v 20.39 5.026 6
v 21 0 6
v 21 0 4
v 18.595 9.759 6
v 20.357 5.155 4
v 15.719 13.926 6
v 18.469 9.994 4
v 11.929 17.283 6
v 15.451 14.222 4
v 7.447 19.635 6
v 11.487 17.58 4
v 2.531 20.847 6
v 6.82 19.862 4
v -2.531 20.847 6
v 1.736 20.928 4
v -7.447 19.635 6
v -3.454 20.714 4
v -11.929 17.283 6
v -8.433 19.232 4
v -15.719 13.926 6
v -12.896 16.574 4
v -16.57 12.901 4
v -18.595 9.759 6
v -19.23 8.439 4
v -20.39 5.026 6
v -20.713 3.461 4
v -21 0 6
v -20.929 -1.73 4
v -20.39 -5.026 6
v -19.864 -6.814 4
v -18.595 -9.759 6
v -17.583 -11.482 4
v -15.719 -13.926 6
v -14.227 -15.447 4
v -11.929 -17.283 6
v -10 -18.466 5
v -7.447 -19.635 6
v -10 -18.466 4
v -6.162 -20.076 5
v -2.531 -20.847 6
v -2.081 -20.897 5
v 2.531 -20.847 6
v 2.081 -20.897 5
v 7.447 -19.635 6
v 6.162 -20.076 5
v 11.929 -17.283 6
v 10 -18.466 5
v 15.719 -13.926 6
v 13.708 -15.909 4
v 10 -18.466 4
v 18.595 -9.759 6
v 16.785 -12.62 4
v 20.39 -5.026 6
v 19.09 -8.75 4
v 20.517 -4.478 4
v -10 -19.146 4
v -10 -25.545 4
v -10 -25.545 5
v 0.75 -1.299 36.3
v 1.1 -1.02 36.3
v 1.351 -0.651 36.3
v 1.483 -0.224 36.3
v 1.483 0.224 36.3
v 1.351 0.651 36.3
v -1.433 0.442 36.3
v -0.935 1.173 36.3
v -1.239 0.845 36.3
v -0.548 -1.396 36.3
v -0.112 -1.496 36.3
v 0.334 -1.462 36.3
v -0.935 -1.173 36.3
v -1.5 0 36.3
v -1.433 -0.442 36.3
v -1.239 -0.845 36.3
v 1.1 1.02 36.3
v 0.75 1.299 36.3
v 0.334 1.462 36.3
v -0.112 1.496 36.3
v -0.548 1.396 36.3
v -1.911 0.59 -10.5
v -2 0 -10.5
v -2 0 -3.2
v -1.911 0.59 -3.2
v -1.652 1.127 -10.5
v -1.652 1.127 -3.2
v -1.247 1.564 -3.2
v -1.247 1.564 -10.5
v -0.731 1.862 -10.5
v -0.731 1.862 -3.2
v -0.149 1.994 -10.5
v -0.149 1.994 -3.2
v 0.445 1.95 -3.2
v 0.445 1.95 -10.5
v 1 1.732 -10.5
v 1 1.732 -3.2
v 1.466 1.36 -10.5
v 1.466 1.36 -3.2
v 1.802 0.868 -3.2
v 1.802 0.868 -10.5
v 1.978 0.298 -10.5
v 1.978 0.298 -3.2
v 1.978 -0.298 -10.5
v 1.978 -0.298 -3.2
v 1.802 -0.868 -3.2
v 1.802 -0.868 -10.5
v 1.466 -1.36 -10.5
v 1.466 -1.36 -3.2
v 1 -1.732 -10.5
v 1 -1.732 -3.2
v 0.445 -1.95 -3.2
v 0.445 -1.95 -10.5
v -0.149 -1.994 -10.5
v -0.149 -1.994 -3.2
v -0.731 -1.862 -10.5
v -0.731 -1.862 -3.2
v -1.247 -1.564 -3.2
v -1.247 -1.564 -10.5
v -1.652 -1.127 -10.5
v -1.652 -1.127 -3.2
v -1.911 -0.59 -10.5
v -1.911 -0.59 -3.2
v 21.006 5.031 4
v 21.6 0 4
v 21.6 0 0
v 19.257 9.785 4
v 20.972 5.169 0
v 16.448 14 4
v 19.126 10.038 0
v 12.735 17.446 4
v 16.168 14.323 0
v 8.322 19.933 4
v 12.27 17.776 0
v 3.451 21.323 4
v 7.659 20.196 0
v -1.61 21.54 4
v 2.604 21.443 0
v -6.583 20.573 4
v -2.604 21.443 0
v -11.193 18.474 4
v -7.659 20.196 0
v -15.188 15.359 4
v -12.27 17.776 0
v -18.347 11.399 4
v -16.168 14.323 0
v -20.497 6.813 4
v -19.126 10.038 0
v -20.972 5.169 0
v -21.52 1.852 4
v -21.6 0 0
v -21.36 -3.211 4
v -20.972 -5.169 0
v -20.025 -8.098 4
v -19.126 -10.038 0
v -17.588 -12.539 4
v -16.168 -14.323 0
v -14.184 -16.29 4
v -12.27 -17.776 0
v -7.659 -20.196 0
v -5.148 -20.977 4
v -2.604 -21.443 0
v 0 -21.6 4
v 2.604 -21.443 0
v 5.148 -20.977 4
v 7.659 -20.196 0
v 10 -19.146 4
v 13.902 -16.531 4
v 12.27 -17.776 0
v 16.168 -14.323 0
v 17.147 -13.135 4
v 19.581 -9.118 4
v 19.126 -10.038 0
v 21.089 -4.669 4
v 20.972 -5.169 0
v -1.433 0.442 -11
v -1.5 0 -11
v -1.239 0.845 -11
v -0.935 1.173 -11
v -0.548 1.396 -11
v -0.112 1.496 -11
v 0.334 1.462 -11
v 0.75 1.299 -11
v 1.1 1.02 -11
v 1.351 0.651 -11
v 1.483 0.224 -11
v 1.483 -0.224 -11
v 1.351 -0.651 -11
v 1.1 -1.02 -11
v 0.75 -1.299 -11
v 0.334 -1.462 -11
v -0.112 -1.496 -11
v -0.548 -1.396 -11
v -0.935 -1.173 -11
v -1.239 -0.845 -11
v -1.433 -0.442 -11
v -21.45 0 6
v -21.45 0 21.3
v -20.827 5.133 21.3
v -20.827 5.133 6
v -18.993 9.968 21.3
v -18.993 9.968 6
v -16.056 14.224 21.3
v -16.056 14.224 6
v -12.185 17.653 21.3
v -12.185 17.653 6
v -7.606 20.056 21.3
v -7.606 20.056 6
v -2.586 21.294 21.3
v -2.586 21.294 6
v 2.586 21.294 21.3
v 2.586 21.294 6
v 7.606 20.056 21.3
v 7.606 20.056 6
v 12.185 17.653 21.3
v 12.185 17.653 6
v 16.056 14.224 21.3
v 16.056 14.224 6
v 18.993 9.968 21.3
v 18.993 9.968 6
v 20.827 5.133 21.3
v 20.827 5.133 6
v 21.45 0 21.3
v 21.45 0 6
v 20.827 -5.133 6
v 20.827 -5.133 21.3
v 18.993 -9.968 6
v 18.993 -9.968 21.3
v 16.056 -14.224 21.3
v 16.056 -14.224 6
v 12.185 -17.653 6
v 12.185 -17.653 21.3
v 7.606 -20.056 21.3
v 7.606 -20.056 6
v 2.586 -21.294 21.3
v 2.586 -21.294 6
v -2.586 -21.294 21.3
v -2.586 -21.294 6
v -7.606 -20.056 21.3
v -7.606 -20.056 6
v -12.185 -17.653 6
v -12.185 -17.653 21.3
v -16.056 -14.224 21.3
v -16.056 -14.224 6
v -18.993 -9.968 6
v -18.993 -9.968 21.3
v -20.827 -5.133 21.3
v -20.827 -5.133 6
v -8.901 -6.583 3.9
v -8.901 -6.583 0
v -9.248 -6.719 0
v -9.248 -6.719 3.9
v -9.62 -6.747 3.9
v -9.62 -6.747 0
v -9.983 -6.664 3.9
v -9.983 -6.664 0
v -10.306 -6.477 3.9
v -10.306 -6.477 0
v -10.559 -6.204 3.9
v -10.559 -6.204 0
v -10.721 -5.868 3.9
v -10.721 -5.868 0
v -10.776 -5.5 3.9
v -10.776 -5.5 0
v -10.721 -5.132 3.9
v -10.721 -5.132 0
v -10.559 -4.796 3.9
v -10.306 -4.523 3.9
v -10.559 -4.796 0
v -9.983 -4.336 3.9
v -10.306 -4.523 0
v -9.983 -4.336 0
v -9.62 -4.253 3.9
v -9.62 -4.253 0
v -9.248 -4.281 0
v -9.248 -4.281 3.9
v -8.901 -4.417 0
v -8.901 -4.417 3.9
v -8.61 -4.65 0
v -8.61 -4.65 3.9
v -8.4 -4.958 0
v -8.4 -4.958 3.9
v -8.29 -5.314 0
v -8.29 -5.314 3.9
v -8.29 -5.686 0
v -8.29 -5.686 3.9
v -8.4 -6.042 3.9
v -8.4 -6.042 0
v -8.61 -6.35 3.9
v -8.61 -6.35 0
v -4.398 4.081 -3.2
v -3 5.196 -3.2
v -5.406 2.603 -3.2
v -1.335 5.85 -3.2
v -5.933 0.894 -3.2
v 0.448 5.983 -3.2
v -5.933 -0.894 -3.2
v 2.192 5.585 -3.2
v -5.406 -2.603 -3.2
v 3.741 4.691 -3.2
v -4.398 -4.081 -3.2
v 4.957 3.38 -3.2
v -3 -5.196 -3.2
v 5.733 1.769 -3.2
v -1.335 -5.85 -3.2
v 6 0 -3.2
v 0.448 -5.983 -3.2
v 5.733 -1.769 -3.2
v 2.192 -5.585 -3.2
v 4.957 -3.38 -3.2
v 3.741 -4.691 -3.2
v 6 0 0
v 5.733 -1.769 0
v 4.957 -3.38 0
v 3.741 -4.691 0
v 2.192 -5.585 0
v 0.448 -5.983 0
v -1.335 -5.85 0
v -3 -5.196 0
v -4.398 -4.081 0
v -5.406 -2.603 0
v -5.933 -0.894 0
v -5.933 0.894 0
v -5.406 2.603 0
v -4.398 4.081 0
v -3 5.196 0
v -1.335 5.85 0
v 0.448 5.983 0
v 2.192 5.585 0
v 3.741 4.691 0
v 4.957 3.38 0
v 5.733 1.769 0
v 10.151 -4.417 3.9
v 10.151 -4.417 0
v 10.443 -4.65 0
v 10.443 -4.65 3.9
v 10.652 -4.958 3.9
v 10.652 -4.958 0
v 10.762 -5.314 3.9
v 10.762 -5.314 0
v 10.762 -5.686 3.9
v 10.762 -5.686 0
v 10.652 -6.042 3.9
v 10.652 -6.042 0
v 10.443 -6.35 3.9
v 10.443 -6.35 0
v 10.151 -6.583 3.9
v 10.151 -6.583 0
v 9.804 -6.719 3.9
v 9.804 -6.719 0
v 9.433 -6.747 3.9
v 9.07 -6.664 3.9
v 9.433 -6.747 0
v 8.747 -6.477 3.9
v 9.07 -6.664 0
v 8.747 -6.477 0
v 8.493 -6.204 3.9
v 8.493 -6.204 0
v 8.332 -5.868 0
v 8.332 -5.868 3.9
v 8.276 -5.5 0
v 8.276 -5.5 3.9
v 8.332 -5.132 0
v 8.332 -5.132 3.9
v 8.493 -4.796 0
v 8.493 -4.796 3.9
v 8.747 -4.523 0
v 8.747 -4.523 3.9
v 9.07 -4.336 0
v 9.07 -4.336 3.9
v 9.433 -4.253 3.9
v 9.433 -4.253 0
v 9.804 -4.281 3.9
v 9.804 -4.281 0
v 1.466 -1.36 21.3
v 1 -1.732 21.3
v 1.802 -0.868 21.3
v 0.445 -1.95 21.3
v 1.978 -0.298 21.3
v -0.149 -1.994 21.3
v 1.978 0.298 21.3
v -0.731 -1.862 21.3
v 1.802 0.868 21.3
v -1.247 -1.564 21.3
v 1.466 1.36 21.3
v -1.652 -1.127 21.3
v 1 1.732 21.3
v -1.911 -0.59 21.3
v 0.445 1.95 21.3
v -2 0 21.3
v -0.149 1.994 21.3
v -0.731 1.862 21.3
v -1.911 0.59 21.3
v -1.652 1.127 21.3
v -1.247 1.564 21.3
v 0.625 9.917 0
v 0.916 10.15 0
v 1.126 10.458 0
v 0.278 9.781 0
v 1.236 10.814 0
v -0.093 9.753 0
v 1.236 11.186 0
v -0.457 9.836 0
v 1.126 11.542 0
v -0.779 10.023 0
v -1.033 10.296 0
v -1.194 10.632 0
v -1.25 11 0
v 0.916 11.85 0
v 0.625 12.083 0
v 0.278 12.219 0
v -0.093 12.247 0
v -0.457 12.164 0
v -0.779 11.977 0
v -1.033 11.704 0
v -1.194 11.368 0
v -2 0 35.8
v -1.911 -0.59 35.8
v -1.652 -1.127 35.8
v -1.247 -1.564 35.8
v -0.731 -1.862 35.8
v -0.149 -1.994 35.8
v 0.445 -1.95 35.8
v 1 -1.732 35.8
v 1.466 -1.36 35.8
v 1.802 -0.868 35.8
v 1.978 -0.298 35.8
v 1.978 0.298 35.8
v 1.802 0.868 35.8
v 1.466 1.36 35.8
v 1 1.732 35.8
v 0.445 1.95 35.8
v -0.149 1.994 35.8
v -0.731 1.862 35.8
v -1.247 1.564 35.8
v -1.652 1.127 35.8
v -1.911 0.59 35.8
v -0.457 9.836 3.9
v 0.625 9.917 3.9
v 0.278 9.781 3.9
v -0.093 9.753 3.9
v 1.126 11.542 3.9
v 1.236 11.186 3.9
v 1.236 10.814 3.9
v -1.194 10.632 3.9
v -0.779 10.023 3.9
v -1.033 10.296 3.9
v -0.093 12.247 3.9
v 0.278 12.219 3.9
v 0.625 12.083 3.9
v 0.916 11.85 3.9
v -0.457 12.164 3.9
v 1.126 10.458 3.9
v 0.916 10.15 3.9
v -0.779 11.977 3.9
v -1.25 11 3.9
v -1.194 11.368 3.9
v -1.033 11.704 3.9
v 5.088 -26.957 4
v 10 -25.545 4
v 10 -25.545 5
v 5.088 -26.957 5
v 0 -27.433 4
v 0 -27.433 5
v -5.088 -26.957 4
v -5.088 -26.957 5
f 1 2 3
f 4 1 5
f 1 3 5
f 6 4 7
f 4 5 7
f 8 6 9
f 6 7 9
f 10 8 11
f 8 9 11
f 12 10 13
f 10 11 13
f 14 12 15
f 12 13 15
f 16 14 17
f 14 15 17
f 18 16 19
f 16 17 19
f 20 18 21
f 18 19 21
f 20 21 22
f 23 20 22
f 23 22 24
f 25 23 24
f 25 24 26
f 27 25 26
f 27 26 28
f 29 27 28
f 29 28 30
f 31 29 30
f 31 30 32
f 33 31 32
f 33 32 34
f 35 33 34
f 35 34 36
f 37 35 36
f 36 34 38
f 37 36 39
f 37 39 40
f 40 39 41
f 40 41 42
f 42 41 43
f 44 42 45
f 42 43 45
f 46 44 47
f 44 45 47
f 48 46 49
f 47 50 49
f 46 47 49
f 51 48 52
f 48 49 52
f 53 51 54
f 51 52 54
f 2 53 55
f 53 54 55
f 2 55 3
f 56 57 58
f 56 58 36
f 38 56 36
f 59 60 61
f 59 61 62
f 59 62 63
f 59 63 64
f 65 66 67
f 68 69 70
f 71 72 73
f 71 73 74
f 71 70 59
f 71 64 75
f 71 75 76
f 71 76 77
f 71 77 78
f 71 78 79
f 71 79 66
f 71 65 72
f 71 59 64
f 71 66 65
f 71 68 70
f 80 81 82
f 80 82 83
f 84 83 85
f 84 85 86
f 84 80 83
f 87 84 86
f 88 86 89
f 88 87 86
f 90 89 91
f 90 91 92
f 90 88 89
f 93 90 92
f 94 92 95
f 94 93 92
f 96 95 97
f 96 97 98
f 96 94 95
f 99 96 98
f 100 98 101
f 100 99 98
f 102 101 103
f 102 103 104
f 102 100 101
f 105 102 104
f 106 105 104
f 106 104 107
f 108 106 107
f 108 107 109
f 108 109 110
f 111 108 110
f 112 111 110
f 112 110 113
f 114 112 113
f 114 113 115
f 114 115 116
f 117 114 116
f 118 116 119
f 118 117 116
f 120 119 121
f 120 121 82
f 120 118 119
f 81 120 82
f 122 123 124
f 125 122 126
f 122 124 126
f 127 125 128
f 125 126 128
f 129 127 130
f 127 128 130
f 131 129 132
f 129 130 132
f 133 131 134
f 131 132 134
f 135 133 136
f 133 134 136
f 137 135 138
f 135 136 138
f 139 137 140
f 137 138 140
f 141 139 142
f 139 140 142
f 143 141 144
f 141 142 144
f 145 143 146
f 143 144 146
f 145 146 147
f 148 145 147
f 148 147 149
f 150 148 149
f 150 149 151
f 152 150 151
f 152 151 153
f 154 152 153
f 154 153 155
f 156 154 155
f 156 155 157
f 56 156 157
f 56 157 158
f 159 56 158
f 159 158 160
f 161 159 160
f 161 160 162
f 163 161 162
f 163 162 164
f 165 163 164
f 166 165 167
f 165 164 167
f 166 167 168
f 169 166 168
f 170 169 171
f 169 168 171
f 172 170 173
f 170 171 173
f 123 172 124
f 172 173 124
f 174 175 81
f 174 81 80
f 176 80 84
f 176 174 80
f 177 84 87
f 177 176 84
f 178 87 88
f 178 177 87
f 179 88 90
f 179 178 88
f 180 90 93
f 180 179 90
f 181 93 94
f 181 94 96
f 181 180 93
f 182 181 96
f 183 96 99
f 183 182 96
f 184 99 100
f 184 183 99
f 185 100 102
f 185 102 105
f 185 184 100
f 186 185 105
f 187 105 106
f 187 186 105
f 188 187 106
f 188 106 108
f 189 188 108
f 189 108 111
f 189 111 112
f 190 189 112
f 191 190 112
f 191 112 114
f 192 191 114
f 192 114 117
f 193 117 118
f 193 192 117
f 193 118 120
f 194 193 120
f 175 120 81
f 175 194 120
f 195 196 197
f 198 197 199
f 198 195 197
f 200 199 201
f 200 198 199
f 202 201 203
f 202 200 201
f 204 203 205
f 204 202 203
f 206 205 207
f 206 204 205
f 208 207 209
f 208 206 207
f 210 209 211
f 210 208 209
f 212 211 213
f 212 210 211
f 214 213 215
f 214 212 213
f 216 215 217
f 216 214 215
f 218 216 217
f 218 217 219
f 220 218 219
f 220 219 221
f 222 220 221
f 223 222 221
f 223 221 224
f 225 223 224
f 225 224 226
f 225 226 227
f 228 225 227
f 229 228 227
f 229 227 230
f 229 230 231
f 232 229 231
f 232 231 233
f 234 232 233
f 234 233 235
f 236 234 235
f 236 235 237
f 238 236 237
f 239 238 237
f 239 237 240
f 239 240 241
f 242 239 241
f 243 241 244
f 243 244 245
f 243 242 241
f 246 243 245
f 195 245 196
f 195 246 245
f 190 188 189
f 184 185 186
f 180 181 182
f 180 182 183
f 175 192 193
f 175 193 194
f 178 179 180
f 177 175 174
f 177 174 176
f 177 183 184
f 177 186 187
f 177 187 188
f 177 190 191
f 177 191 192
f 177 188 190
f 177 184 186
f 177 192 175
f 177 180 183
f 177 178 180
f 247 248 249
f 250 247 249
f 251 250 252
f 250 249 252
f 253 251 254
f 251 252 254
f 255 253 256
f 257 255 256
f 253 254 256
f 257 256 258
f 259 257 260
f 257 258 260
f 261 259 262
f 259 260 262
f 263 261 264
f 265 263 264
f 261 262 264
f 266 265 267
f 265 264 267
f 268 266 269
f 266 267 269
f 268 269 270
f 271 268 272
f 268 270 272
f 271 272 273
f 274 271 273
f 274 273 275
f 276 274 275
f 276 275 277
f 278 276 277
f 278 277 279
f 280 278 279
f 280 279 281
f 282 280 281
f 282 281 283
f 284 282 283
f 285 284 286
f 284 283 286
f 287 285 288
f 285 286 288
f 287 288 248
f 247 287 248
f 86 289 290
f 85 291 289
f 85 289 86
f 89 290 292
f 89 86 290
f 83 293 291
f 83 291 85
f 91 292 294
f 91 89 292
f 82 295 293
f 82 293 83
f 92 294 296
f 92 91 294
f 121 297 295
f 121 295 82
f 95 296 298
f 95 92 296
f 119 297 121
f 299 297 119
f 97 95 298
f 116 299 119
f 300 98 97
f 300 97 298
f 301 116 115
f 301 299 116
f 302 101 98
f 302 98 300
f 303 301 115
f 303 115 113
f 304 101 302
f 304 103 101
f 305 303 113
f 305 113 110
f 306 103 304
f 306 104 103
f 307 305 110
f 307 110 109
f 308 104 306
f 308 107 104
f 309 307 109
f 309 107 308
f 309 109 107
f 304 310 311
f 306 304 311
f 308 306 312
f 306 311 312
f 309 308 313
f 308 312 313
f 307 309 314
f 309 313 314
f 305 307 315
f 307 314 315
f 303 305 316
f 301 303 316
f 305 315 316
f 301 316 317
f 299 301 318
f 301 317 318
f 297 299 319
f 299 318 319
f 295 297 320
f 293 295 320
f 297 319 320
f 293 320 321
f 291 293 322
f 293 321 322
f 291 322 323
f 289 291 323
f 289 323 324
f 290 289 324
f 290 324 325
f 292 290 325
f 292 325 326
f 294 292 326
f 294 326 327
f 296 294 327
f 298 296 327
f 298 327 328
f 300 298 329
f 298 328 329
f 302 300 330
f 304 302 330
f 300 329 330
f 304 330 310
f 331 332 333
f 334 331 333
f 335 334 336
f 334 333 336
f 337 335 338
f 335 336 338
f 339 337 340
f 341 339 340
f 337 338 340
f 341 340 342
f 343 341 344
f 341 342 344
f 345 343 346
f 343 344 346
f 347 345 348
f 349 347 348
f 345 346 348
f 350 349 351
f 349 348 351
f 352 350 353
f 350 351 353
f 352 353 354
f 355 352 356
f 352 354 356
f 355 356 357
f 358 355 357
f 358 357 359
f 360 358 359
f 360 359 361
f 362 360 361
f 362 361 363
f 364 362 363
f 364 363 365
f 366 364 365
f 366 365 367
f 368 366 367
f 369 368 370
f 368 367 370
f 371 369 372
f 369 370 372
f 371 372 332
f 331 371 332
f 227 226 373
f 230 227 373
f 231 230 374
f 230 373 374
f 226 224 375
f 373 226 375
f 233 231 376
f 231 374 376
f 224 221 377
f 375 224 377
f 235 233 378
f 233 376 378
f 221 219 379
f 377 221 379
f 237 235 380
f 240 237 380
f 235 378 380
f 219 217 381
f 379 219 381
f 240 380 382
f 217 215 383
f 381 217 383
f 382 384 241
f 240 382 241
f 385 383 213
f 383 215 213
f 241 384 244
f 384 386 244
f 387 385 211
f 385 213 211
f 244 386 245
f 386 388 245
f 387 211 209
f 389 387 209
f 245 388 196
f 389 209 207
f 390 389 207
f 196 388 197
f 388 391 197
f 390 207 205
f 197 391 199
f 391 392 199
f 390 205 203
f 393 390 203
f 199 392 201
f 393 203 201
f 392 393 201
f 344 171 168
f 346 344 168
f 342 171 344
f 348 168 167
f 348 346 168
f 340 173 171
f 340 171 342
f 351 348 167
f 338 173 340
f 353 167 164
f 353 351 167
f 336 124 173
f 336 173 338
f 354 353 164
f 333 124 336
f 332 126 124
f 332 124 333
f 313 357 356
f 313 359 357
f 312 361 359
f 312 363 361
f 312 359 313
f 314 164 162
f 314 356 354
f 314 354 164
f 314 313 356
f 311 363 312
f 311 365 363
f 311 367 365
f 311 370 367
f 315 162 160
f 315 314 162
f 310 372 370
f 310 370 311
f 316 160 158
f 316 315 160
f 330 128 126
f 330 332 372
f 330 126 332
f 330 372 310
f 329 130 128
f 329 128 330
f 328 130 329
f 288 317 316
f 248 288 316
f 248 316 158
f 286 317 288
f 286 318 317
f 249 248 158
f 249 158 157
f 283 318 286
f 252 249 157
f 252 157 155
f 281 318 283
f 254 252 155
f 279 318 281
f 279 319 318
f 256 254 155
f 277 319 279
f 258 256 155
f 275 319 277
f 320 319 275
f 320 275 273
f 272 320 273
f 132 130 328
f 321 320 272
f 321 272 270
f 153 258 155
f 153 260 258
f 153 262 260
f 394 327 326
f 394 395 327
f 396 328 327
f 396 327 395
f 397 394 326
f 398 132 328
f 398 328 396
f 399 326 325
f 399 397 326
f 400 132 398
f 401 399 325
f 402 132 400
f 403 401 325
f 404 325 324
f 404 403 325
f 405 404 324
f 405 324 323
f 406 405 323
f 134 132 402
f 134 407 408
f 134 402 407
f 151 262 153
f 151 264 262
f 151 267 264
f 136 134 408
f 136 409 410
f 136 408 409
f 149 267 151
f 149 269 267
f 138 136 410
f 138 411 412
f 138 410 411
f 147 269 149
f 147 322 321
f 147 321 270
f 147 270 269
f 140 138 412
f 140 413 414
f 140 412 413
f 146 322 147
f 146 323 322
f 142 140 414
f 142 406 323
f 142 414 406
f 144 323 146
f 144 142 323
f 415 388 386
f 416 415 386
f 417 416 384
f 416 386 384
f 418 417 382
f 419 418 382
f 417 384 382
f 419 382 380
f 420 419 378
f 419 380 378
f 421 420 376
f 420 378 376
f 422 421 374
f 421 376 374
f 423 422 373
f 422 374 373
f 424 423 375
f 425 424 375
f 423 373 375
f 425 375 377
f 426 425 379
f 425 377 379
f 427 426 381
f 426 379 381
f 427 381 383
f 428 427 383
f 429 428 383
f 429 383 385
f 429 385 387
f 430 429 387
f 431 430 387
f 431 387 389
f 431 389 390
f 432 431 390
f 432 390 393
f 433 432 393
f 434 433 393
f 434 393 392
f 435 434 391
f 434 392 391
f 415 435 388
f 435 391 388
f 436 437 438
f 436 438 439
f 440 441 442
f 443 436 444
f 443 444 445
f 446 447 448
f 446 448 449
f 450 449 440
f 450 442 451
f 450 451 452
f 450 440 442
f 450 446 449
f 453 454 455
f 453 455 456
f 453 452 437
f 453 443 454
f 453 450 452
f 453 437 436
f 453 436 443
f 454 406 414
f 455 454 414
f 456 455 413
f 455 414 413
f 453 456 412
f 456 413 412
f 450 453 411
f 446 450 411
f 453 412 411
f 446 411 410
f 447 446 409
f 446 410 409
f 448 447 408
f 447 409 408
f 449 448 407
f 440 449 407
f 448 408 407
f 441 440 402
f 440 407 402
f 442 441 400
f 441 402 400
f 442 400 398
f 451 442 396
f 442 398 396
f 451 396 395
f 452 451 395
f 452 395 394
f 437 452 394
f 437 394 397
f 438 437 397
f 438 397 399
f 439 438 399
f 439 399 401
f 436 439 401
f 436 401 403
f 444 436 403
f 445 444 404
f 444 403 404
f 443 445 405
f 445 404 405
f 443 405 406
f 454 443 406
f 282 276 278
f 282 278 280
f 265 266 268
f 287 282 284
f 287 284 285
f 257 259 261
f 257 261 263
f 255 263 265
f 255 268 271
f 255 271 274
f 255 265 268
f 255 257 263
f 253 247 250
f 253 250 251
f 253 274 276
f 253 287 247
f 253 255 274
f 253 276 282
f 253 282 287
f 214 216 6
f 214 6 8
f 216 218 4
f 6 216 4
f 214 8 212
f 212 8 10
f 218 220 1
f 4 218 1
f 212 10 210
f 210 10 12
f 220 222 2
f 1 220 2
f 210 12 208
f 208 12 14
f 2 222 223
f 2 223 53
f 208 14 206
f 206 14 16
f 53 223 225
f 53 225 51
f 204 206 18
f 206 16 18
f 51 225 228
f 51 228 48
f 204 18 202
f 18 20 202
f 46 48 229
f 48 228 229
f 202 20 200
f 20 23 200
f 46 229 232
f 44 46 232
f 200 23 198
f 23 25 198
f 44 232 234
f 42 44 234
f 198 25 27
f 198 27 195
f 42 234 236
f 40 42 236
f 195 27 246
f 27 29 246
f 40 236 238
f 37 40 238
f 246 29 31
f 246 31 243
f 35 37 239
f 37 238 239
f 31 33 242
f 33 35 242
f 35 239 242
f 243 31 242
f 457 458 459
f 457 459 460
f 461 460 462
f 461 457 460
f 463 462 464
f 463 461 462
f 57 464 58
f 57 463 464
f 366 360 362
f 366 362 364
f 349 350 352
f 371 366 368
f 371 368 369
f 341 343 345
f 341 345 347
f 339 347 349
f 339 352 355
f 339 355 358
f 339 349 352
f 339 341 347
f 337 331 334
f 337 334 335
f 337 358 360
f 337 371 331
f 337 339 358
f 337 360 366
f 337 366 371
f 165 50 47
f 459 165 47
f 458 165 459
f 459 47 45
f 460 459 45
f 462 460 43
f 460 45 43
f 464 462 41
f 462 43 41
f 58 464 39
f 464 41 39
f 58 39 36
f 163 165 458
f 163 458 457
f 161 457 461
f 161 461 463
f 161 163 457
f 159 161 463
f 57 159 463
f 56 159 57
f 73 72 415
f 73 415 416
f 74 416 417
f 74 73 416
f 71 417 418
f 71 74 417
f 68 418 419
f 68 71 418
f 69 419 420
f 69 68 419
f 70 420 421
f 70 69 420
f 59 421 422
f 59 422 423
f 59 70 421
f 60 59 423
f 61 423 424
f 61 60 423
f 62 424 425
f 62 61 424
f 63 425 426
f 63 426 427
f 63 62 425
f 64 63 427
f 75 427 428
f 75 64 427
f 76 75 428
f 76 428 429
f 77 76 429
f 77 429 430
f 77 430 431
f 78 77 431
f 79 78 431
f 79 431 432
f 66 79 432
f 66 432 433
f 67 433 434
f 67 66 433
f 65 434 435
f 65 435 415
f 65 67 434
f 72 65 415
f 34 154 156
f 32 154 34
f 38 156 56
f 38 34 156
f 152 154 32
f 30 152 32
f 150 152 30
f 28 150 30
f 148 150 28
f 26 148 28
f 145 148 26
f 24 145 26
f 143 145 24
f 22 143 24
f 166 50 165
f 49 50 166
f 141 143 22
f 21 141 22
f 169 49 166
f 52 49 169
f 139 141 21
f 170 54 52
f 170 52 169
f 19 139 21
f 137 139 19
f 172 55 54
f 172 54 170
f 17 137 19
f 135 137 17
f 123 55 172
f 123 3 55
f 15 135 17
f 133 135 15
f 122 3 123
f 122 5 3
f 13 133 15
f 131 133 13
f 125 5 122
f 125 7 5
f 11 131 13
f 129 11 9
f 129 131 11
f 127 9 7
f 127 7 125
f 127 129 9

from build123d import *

# Parameters (mm, degrees)
SKETCH_1_R               = 21.6
EXTRUDE_1_DEPTH          = 4
SKETCH_6_R               = 21.45
EXTRUDE_6_DEPTH          = 21.3
SKETCH_2_R               = 2
EXTRUDE_2_DEPTH          = 15
SKETCH_3_R               = 1.25
CUT_EXTRUDE_3_DEPTH      = 3.9
PATTERN_CIRCULAR_1_COUNT = 3
SKETCH_4_R               = 6
EXTRUDE_4_DEPTH          = 3.2
EXTRUDE_START            = 7.8
SKETCH_5_R               = 2
EXTRUDE_5_DEPTH          = 7.8
SKETCH_7_R               = 21.45
SKETCH_7_R_2             = 21
CUT_EXTRUDE_7_DEPTH      = 2
EXTRUDE_9_DEPTH          = 1
CHAMFER_1_SIZE           = 0.5


with BuildPart() as part:
    # 草图1 → 拉伸1 (new body)
    with BuildSketch(Plane.XY):
        Circle(SKETCH_1_R)
    extrude(amount=EXTRUDE_1_DEPTH)

    # 草图6 → 拉伸6 (add)
    with BuildSketch(Plane(origin=(0, 0, 0), x_dir=(-1, 0, 0), z_dir=(0, 0, -1))):
        Circle(SKETCH_6_R)
    extrude(amount=-EXTRUDE_6_DEPTH)

    # 草图2 → 拉伸2 (add)
    with BuildSketch(Plane.XY.offset(21.3)):
        with Locations(Location((0, 0, 0), (0, 0, 180))):
            Circle(SKETCH_2_R)
    extrude(amount=EXTRUDE_2_DEPTH)

    # 草图3 → 拉伸3 (cut)
    with BuildSketch(Plane(origin=(0, 0, 0), x_dir=(-1, 0, 0), z_dir=(0, 0, -1))):
        with Locations((0, 11)):
            Circle(SKETCH_3_R)
    cut_extrude_3 = extrude(amount=-CUT_EXTRUDE_3_DEPTH, mode=Mode.SUBTRACT)

    # 阵列(圆周)1: 拉伸3 ×3 about axis
    pattern_circular_1_axis = Axis((0, 0, 0), (0, 0, 1))
    for i in range(1, PATTERN_CIRCULAR_1_COUNT):
        add(cut_extrude_3.rotate(pattern_circular_1_axis, i * 360 / PATTERN_CIRCULAR_1_COUNT), mode=Mode.SUBTRACT)

    # 草图4 → 拉伸4 (add)
    with BuildSketch(Plane(origin=(0, 0, 0), x_dir=(-1, 0, 0), z_dir=(0, 0, -1))):
        with Locations(Location((0, 0, 0), (0, 0, 180))):
            Circle(SKETCH_4_R)
    extrude(amount=EXTRUDE_4_DEPTH)

    # 草图5 → 拉伸5 (add)
    with BuildSketch(Plane(origin=(0, 0, -3.2), x_dir=(-1, 0, 0), z_dir=(0, 0, -1)).offset(EXTRUDE_START)):
        Circle(SKETCH_5_R)
    extrude(amount=-EXTRUDE_5_DEPTH)

    # 草图7 → 拉伸7 (cut)
    with BuildSketch(Plane.XY.offset(4)):
        with Locations(Location((0, 0, 0), (0, 0, 180))):
            Circle(SKETCH_7_R)
        Circle(SKETCH_7_R_2, mode=Mode.SUBTRACT)
    extrude(amount=CUT_EXTRUDE_7_DEPTH, mode=Mode.SUBTRACT)

    # 草图9 → 拉伸9 (add)
    with BuildSketch(Plane.XY.offset(4)):
        with BuildLine():
            Line((-10, -18.466185313), (10, -18.466185313))
            Line((10, -18.466185313), (10, -25.545340812))
            ThreePointArc((10, -25.545340812), (0, -27.432907925), (-10, -25.545340812))
            Line((-10, -25.545340812), (-10, -18.466185313))
        make_face()
    extrude(amount=EXTRUDE_9_DEPTH)

    # 倒角1
    chamfer_1_edges = [part.edges().sort_by_distance(p)[0] for p in [
        (2, 0, 36.3),
        (2, 0, -11),
    ]]
    chamfer(chamfer_1_edges, length=CHAMFER_1_SIZE)


solid = part.part
